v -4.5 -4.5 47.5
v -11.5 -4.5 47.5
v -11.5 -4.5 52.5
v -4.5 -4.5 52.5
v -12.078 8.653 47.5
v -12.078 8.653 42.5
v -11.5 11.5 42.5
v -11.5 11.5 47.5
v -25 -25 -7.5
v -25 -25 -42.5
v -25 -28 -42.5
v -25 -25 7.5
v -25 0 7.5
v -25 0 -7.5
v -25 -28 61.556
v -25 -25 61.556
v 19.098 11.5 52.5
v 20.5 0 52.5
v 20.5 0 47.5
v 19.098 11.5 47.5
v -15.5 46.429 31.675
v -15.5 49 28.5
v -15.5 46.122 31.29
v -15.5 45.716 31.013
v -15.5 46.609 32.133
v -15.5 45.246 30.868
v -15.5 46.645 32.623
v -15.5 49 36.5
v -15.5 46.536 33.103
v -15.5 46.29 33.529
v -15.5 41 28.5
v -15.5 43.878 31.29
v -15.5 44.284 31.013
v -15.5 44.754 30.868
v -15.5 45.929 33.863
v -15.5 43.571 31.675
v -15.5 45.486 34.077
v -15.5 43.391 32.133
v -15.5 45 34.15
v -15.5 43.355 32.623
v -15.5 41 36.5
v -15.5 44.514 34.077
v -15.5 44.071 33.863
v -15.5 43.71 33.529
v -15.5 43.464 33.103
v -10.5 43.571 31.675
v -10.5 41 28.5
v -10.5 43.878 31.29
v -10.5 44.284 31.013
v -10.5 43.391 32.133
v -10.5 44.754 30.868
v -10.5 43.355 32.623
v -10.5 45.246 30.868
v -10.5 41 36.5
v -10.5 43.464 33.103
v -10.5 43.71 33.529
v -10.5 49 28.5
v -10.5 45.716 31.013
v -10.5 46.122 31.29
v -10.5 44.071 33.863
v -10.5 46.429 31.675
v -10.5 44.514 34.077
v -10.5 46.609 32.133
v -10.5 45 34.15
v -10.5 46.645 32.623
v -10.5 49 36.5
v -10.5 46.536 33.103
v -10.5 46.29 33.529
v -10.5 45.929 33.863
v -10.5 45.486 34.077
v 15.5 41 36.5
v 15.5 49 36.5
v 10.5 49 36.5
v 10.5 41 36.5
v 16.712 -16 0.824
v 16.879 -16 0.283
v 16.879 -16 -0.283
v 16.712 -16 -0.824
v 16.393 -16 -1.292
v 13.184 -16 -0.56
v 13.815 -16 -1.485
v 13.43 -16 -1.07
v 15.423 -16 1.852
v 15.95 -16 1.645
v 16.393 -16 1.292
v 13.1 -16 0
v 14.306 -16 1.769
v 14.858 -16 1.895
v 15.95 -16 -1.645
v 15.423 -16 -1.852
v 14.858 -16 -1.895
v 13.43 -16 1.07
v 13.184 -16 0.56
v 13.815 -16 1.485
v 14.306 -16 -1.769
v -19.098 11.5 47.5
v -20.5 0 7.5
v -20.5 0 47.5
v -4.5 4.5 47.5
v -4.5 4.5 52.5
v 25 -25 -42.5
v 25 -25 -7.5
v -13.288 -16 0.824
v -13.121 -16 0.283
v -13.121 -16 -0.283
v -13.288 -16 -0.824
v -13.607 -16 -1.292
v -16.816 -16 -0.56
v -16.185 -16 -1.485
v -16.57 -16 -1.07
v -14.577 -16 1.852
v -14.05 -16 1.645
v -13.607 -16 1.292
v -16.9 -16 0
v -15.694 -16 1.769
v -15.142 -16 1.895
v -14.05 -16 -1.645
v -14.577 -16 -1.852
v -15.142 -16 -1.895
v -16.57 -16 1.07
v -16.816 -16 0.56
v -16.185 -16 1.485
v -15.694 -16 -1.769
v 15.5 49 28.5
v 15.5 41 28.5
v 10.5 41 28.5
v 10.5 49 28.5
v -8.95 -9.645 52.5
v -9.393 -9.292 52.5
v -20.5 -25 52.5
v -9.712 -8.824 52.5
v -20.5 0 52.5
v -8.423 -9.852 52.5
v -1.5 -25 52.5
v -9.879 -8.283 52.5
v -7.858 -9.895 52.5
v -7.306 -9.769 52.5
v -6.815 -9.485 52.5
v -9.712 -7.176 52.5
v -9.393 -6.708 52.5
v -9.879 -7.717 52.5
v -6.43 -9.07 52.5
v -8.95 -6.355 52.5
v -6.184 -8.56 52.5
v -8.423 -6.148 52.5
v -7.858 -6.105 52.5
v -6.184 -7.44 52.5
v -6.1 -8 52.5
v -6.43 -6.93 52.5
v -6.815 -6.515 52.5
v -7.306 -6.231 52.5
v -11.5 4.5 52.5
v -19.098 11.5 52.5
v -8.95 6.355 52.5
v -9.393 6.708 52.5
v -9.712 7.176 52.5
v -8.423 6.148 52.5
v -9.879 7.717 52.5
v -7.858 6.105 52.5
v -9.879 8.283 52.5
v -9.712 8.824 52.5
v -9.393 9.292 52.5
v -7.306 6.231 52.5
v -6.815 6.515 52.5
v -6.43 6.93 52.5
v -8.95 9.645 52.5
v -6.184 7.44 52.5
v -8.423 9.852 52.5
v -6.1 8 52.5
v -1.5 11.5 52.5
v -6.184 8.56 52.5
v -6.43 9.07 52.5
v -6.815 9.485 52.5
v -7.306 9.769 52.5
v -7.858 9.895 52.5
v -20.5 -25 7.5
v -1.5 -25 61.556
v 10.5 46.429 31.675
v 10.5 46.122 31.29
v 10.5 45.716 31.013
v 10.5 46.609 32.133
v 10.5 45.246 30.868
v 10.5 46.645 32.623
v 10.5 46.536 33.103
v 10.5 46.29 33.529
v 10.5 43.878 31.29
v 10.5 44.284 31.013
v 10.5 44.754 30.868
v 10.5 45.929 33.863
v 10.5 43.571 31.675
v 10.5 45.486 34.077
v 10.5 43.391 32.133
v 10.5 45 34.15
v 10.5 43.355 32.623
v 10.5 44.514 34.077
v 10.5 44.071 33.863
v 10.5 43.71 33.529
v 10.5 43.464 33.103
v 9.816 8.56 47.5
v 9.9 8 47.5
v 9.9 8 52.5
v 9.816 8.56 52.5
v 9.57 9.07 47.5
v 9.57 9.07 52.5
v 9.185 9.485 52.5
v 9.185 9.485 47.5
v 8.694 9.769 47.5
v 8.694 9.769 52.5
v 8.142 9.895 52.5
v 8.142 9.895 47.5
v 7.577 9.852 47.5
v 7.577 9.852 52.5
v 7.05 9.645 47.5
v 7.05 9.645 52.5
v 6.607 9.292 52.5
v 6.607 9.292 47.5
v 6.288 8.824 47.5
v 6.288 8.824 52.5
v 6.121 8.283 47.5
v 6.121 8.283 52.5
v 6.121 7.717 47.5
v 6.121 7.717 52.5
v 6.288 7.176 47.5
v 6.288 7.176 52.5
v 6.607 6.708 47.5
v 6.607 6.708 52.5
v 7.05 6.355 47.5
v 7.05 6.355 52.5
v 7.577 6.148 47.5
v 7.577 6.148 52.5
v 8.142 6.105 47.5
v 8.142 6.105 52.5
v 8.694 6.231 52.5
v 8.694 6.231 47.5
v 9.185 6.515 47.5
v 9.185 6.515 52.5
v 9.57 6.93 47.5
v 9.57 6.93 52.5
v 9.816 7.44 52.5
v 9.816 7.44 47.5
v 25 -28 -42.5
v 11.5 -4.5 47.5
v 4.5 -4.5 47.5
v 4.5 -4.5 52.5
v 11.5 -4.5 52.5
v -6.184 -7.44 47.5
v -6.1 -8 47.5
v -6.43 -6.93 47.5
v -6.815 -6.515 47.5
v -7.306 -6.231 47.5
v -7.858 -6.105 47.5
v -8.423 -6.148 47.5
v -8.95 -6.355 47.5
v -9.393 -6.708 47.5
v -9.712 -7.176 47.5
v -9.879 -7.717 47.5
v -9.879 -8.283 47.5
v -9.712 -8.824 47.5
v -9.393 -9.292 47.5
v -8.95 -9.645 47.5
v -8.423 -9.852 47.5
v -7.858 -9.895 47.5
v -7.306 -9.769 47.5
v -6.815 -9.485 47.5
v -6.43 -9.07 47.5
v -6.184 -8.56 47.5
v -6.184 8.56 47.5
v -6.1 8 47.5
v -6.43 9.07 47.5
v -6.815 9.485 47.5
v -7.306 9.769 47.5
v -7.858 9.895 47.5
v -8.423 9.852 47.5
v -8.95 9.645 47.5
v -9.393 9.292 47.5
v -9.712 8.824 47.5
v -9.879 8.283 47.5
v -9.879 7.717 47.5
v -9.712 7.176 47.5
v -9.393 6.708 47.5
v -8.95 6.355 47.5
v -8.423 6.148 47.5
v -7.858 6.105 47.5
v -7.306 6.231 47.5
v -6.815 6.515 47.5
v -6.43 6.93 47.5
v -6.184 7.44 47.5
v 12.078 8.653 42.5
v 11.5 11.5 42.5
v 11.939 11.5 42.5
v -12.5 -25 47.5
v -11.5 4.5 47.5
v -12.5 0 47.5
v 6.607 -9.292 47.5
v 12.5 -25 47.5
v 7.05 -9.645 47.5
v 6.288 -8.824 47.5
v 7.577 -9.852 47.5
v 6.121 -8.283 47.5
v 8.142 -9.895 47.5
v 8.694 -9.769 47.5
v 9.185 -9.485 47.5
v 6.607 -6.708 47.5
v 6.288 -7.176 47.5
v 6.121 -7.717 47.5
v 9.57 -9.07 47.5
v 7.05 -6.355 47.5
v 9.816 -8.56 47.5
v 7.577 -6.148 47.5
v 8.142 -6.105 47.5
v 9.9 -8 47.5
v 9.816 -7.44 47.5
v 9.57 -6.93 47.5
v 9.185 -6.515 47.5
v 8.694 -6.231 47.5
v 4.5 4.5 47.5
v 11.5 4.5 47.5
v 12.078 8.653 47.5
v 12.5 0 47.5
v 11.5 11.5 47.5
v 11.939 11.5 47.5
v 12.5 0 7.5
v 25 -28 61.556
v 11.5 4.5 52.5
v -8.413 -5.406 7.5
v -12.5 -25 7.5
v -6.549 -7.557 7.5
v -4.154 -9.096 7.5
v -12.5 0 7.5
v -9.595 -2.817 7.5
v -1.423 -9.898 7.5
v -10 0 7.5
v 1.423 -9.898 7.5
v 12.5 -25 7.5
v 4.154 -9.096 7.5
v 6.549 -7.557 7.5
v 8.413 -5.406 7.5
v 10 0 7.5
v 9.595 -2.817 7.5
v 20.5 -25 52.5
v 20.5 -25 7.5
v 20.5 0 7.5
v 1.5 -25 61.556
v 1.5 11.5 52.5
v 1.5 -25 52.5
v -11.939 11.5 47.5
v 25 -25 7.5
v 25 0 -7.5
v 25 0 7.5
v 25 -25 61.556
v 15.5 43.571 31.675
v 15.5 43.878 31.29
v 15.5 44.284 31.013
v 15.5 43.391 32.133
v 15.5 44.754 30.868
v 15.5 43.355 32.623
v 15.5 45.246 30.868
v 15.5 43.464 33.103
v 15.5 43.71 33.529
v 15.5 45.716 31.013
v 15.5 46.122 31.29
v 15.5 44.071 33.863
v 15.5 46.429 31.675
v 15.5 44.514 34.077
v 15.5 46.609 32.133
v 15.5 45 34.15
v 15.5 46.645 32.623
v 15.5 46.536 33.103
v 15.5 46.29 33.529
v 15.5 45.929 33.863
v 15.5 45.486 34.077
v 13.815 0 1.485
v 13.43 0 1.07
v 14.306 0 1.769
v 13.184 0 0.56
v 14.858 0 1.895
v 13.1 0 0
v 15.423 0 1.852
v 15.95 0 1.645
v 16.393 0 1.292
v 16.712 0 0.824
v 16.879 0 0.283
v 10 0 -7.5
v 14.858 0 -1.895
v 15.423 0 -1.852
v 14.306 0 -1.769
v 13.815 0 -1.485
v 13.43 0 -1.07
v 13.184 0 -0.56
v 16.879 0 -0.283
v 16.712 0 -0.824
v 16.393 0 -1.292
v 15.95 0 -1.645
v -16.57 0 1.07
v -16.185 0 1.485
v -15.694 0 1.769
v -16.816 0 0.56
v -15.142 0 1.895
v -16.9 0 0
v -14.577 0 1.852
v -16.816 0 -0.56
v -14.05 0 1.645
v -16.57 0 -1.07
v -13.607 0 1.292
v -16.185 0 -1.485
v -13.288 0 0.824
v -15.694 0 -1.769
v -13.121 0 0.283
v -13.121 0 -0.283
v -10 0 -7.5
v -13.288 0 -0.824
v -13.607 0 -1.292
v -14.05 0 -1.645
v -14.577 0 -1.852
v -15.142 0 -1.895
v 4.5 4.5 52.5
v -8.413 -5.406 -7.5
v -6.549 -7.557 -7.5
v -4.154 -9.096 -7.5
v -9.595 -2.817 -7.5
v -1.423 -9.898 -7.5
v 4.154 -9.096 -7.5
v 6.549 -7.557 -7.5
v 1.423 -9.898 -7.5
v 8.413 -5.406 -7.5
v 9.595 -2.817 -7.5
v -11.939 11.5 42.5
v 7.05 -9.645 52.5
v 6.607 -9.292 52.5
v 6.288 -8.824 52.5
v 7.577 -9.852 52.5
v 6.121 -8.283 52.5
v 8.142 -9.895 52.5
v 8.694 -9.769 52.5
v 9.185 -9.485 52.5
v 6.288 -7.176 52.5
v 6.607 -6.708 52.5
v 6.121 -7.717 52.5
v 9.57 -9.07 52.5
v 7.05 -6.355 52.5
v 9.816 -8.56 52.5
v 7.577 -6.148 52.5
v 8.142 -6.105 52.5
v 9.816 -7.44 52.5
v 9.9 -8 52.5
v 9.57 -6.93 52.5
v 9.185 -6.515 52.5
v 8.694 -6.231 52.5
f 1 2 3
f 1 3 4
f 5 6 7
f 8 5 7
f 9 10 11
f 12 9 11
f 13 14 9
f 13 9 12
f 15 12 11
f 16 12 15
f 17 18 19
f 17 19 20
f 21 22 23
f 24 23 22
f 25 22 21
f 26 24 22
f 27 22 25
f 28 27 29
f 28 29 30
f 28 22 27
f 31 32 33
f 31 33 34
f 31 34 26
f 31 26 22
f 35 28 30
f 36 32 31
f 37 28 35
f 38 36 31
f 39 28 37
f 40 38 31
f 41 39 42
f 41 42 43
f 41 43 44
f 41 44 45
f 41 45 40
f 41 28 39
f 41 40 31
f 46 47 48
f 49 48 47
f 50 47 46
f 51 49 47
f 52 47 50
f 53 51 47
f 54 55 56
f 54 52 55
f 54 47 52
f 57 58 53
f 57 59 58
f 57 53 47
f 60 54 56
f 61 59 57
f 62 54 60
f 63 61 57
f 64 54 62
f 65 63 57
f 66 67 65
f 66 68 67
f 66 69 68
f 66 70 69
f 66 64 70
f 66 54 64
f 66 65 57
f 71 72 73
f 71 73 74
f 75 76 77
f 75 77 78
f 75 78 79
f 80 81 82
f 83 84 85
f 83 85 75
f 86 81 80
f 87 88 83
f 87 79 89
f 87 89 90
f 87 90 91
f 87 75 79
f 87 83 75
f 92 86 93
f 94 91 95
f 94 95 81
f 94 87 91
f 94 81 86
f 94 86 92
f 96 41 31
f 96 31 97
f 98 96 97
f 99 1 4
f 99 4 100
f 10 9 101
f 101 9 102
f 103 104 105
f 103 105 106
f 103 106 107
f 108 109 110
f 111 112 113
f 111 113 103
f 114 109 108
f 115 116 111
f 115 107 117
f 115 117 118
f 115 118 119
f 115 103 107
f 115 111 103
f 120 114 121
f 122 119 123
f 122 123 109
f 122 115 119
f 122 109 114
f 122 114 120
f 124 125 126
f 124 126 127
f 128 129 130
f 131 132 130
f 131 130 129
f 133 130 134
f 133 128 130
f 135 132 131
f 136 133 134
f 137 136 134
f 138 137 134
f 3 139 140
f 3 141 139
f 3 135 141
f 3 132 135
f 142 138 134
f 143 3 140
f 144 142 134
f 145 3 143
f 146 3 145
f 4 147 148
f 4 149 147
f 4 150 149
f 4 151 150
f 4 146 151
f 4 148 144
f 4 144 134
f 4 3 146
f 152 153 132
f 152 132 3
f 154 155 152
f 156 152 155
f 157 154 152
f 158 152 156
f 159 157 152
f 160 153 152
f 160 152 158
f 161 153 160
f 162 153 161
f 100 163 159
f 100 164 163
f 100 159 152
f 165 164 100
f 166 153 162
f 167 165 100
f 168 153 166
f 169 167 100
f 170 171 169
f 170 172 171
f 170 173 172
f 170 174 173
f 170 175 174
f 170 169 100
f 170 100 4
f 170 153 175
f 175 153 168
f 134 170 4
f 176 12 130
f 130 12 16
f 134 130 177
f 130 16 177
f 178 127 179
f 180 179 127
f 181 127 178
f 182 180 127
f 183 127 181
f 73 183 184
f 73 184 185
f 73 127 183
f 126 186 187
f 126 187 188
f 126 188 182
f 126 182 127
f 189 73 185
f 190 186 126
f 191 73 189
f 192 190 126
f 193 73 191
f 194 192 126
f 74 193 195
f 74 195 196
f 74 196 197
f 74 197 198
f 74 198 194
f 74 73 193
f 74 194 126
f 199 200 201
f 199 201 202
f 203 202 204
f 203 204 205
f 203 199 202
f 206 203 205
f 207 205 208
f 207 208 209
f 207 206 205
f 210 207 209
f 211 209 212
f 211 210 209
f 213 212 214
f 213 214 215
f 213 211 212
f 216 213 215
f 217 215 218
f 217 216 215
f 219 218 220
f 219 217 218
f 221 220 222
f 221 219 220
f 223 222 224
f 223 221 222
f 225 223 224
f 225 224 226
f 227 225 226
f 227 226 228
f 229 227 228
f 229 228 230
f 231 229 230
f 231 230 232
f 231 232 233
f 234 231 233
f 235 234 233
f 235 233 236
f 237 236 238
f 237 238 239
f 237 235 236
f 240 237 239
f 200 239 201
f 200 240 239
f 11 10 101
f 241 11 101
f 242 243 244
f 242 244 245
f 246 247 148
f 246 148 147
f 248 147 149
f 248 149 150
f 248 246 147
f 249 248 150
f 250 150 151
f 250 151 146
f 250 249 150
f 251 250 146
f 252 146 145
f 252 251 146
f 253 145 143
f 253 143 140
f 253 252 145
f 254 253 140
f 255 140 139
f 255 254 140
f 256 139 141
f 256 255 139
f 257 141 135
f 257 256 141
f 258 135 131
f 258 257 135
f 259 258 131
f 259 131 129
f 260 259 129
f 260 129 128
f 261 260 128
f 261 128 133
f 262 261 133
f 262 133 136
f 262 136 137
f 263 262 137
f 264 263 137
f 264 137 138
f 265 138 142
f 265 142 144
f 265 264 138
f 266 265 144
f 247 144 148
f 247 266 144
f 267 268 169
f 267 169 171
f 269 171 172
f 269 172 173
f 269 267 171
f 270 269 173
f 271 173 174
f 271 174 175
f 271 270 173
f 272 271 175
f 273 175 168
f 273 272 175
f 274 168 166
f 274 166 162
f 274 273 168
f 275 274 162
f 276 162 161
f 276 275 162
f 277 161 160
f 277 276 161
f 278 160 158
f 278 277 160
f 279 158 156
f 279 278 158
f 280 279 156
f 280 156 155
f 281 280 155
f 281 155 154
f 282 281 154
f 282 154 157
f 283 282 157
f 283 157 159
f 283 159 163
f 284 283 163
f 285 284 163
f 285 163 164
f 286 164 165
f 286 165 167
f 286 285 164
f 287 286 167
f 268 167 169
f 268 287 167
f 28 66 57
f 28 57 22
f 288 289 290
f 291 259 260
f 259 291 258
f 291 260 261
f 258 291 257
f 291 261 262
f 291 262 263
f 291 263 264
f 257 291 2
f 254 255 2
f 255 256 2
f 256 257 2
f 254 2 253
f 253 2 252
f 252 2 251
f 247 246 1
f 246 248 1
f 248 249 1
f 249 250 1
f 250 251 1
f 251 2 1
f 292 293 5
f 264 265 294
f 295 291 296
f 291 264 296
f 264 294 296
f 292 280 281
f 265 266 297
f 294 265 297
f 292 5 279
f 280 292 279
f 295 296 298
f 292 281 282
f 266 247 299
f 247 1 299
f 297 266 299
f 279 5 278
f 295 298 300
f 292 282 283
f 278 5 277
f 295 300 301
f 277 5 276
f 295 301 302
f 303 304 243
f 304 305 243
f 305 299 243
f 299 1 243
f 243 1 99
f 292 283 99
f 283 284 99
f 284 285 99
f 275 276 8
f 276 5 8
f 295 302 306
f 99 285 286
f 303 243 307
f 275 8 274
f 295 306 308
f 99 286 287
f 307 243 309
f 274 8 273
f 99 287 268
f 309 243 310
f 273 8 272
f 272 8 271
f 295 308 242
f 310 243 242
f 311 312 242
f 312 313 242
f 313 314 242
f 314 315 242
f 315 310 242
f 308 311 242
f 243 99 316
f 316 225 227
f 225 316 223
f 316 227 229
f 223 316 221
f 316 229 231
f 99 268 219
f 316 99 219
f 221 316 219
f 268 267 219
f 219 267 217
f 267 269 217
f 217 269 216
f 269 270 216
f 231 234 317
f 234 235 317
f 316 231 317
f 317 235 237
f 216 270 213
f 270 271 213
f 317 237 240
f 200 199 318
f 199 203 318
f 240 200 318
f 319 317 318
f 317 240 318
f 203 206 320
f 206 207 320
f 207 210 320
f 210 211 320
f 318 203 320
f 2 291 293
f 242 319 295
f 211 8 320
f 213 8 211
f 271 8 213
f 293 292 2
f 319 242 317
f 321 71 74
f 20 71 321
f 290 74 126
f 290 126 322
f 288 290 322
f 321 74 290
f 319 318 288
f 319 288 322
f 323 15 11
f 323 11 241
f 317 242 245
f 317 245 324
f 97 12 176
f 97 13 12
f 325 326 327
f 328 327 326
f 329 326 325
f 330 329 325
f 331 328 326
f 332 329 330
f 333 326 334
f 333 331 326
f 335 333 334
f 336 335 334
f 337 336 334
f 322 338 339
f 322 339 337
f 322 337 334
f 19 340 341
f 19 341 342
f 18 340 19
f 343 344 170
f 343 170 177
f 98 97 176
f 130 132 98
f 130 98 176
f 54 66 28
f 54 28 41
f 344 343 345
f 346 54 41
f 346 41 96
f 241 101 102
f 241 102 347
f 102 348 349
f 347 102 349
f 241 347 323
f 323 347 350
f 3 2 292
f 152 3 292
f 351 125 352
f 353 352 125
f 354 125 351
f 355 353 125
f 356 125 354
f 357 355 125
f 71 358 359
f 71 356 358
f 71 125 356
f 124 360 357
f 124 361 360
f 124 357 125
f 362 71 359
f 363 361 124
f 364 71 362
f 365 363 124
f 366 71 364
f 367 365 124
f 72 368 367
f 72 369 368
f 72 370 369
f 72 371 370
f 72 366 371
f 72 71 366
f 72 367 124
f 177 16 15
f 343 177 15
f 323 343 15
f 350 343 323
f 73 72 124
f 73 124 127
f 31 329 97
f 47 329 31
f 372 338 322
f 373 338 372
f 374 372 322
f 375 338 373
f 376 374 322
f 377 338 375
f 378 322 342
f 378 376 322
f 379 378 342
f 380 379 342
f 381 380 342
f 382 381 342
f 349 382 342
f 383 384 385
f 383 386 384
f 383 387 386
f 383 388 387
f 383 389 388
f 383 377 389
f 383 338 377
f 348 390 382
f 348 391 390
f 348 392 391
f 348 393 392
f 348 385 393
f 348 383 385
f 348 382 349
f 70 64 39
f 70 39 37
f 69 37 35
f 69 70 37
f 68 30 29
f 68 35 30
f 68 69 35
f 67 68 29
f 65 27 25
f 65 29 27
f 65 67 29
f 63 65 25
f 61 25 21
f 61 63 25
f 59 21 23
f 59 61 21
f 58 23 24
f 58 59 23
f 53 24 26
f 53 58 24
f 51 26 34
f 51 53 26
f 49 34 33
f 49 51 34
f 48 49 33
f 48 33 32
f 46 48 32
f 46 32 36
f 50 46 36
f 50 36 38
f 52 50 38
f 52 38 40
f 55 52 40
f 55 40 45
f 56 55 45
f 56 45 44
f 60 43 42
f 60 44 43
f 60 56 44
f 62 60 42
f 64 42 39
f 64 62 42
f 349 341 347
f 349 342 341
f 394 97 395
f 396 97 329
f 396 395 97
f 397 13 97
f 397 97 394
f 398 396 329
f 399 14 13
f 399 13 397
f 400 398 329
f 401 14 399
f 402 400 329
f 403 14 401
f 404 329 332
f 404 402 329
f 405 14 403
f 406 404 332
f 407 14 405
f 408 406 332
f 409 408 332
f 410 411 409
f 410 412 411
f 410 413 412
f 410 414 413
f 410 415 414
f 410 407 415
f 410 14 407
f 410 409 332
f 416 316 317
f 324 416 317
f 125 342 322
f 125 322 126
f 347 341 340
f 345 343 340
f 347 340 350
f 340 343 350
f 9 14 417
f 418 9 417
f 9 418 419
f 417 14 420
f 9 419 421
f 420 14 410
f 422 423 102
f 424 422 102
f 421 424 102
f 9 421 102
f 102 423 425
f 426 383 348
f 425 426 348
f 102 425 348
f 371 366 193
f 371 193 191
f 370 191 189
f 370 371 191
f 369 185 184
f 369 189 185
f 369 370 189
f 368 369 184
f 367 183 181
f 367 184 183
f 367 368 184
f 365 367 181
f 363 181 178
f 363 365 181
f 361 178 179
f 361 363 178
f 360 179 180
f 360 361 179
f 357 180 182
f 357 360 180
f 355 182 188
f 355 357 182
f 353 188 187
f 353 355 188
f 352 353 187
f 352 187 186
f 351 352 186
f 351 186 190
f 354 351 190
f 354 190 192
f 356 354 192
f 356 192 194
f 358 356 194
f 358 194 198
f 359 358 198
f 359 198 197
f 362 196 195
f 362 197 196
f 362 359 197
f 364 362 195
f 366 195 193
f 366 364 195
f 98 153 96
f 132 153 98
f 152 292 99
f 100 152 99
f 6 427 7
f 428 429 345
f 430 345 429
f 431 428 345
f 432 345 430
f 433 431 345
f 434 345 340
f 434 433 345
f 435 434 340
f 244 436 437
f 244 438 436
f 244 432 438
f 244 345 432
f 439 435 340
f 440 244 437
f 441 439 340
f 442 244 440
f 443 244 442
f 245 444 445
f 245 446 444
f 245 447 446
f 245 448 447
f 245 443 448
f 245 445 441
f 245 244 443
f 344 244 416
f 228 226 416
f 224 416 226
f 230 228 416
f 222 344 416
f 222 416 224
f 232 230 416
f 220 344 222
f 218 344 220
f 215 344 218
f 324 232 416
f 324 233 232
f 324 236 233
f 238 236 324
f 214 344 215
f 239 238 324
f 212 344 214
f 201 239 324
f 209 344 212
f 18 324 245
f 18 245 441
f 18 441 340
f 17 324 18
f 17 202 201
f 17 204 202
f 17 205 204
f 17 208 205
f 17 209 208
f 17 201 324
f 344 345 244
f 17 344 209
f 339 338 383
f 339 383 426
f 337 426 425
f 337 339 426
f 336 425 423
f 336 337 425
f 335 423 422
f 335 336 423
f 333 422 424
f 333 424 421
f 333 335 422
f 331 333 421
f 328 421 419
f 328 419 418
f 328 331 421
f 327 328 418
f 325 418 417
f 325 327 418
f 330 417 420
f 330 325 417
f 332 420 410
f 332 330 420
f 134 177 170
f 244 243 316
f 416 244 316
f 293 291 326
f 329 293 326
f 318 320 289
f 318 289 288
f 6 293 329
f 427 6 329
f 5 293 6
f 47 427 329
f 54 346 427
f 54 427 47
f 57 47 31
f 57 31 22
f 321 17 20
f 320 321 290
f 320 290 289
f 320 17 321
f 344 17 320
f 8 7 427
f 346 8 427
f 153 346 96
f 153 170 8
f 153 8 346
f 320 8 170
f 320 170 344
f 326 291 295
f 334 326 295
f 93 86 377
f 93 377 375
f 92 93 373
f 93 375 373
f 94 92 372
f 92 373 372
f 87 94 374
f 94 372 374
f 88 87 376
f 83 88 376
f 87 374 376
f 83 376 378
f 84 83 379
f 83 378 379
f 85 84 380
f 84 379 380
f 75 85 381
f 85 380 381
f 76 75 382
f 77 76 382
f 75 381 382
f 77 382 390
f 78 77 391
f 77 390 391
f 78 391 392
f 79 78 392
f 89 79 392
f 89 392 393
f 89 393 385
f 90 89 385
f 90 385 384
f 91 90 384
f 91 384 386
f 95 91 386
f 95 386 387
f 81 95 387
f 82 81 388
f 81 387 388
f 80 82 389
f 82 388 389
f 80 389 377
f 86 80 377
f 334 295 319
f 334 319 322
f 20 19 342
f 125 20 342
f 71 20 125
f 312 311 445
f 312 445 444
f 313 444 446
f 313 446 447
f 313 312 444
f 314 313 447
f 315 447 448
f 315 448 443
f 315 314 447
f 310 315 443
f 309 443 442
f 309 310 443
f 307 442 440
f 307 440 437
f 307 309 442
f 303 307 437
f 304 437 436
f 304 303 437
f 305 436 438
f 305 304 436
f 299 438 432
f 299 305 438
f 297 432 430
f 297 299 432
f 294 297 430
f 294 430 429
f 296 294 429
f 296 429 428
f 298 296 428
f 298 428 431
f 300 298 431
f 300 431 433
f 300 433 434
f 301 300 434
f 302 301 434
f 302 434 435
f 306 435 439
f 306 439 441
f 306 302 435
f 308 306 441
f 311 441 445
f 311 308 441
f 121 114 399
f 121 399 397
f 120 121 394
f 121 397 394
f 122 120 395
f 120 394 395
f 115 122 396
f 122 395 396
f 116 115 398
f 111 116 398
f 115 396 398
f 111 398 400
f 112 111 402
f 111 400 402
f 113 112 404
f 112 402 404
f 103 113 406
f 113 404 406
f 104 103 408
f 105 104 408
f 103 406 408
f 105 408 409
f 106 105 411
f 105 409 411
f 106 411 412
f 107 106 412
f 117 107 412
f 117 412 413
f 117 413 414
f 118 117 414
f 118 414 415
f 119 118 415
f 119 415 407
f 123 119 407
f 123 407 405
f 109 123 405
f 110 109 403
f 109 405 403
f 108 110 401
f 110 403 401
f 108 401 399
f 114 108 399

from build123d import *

# Parameters (mm, degrees)
MOTOR_MOUNT_SOLID_DEPTH              = 7.5
ENCODER_DISTANCE_SKETCH_W            = 50
ENCODER_DISTANCE_SKETCH_H            = 55
ENCODER_DISTANCE_SOLID_DEPTH         = 5
ENCODER_MOUNT_SKETCH_R               = 1.9
ENCODER_MOUNT_SKETCH_W               = 7
ENCODER_MOUNT_SKETCH_H               = 9
ENCODER_MOUNT_SOLID_DEPTH            = 5
MOTOR_CLAMP_MOUNTING_HOLES_SKETCH_R  = 1.9
MOTOR_CLAMP_MOUNTING_HOLES_CUT_DEPTH = 16
GUSSET_PLATE_SKETCH_W                = 50
GUSSET_PLATE_SKETCH_H                = 5
GUSSET_PLATE_SOLID_DEPTH             = 16.5
GUSSET_SOLID_DEPTH                   = 1.5
MOUNTING_PLATE_SKETCH_W              = 50
MOUNTING_PLATE_SKETCH_H              = 92
MOUNTING_PLATE_SKETCH_R              = 2.65
MOUNTING_PLATE_SOLID_DEPTH           = 5
MOUNTING_HOLES_CUT_DEPTH             = 100.036609393
MOUNTING_HOLES_CUT_DEPTH_BACK        = 100.036609393
MOUNTING_HOLE_SKETCH_R               = 2.65
MOUNTING_PLATE_TRIM_SKETCH_W         = 50
MOUNTING_PLATE_TRIM_SKETCH_H         = 15.5
MOUNTING_PLATE_TRIM_SKETCH_H_2       = 40
MOUNTING_PLATE_TRIM_SKETCH_W_2       = 23.5
MOUNTING_PLATE_TRIM_SKETCH_H_3       = 16.5
MOUNTING_PLATE_TRIM_CUT_DEPTH        = 2
CUT_EXTRUDE1_DEPTH                   = 105.216121594
CUT_EXTRUDE1_DEPTH_BACK              = 105.216121594
SKETCH1_W                            = 92
SKETCH1_H                            = 35
SKETCH2_W                            = 50
SKETCH2_H                            = 104.056390977
BOSS_EXTRUDE1_DEPTH                  = 3
SKETCH3_W                            = 8
SKETCH3_H                            = 40
BOSS_EXTRUDE2_DEPTH                  = 25
BOSS_EXTRUDE3_DEPTH                  = 40
CUT_EXTRUDE2_DEPTH                   = 89.489769297
CUT_EXTRUDE2_DEPTH_BACK              = 89.489769297
SKETCH5_R                            = 1.65
CUT_EXTRUDE3_DEPTH                   = 89.489769297
CUT_EXTRUDE3_DEPTH_BACK              = 89.489769297
BOSS_EXTRUDE4_DEPTH                  = 10


with BuildPart() as part:
    # Mouting Mount Sketch → Motor Mount Solid (new, symmetric)
    with BuildSketch(Plane.XY):
        with BuildLine():
            Line((-25, -55), (25, -55))
            Line((25, -55), (25, 0))
            Line((25, 0), (10, 0))
            ThreePointArc((10, 0), (0, -10), (-10, 0))
            Line((-10, 0), (-25, 0))
            Line((-25, 0), (-25, -55))
        make_face()
    extrude(amount=MOTOR_MOUNT_SOLID_DEPTH, both=True)

    # Encoder Distance Sketch → Encoder Distance Solid (add)
    with BuildSketch(Plane.XZ.offset(55)):
        with Locations((0, 20)):
            Rectangle(ENCODER_DISTANCE_SKETCH_W, ENCODER_DISTANCE_SKETCH_H)
    extrude(amount=ENCODER_DISTANCE_SOLID_DEPTH)

    # Encoder Mount Sketch → Encoder Mount Solid (add)
    with BuildSketch(Plane.XY.offset(47.5)):
        Polygon((-25, -60), (-25, -55), (-11.5, 11.5), (11.5, 11.5), (25, -55), (25, -60), align=None)
        with Locations((-8, 8)):
            Circle(ENCODER_MOUNT_SKETCH_R, mode=Mode.SUBTRACT)
        with Locations((8, 8)):
            Circle(ENCODER_MOUNT_SKETCH_R, mode=Mode.SUBTRACT)
        with Locations((-8, -8)):
            Circle(ENCODER_MOUNT_SKETCH_R, mode=Mode.SUBTRACT)
        with Locations((8, -8)):
            Circle(ENCODER_MOUNT_SKETCH_R, mode=Mode.SUBTRACT)
        with Locations((-8, 0)):
            Rectangle(ENCODER_MOUNT_SKETCH_W, ENCODER_MOUNT_SKETCH_H, mode=Mode.SUBTRACT)
        with Locations((8, 0)):
            Rectangle(ENCODER_MOUNT_SKETCH_W, ENCODER_MOUNT_SKETCH_H, mode=Mode.SUBTRACT)
    extrude(amount=ENCODER_MOUNT_SOLID_DEPTH)

    # Motor Clamp Mounting Holes Sketch → Motor Clamp Mounting Holes Cut (cut)
    with BuildSketch(Plane(origin=(0, 0, 0), x_dir=(1, 0, 0), z_dir=(0, 1, 0))):
        with Locations(Location((-15, 0, 0), (0, 0, 180))):
            Circle(MOTOR_CLAMP_MOUNTING_HOLES_SKETCH_R)
        with Locations(Location((15, 0, 0), (0, 0, 180))):
            Circle(MOTOR_CLAMP_MOUNTING_HOLES_SKETCH_R)
    extrude(amount=-MOTOR_CLAMP_MOUNTING_HOLES_CUT_DEPTH, mode=Mode.SUBTRACT)

    # Gusset Plate Sketch → Gusset Plate Solid (add)
    with BuildSketch(Plane.XY.offset(52.5)):
        with Locations((0, -57.5)):
            Rectangle(GUSSET_PLATE_SKETCH_W, GUSSET_PLATE_SKETCH_H)
    extrude(amount=GUSSET_PLATE_SOLID_DEPTH)

    # Gusset Sketch → Gusset Solid (add, symmetric)
    with BuildSketch(Plane(origin=(0, 0, 0), x_dir=(0, 0, -1), z_dir=(1, 0, 0))):
        Polygon((-52.5, 11.5), (-69, -55), (-52.5, -55), align=None)
    extrude(amount=GUSSET_SOLID_DEPTH, both=True)

    # Mounting Plate Sketch → Mounting Plate Solid (add)
    with BuildSketch(Plane(origin=(0, -55, 0), x_dir=(1, 0, 0), z_dir=(0, 1, 0))):
        with Locations((0, -23)):
            Rectangle(MOUNTING_PLATE_SKETCH_W, MOUNTING_PLATE_SKETCH_H)
        with Locations((-19, -63)):
            Circle(MOUNTING_PLATE_SKETCH_R, mode=Mode.SUBTRACT)
        with Locations((19, -63)):
            Circle(MOUNTING_PLATE_SKETCH_R, mode=Mode.SUBTRACT)
        with Locations(Location((-19, 17, 0), (0, 0, 270))):
            Circle(MOUNTING_PLATE_SKETCH_R, mode=Mode.SUBTRACT)
        with Locations(Location((19, 17, 0), (0, 0, 270))):
            Circle(MOUNTING_PLATE_SKETCH_R, mode=Mode.SUBTRACT)
    extrude(amount=-MOUNTING_PLATE_SOLID_DEPTH)

    # Mounting Hole Sketch → Mounting Holes Cut (cut, two sides: drawn at the far end of the back side and taken through both)
    with BuildSketch(Plane(origin=(0, -55, 0), x_dir=(1, 0, 0), z_dir=(0, 1, 0)).offset(-MOUNTING_HOLES_CUT_DEPTH_BACK)):
        with Locations(Location((-19, 17, 0), (0, 0, 270))):
            Circle(MOUNTING_HOLE_SKETCH_R)
        with Locations(Location((19, 17, 0), (0, 0, 270))):
            Circle(MOUNTING_HOLE_SKETCH_R)
        with Locations(Location((19, -63, 0), (0, 0, 90))):
            Circle(MOUNTING_HOLE_SKETCH_R)
        with Locations(Location((-19, -63, 0), (0, 0, 90))):
            Circle(MOUNTING_HOLE_SKETCH_R)
    extrude(amount=MOUNTING_HOLES_CUT_DEPTH + MOUNTING_HOLES_CUT_DEPTH_BACK, mode=Mode.SUBTRACT)

    # Mounting Plate Trim Sketch → Mounting Plate Trim Cut (cut)
    with BuildSketch(Plane(origin=(0, -55, 0), x_dir=(1, 0, 0), z_dir=(0, 1, 0))):
        with Locations((0, 15.25)):
            Rectangle(MOUNTING_PLATE_TRIM_SKETCH_W, MOUNTING_PLATE_TRIM_SKETCH_H)
        with Locations((0, -27.5)):
            Rectangle(MOUNTING_PLATE_TRIM_SKETCH_W, MOUNTING_PLATE_TRIM_SKETCH_H_2)
        with Locations((13.25, -60.75)):
            Rectangle(MOUNTING_PLATE_TRIM_SKETCH_W_2, MOUNTING_PLATE_TRIM_SKETCH_H_3)
        with Locations((-13.25, -60.75)):
            Rectangle(MOUNTING_PLATE_TRIM_SKETCH_W_2, MOUNTING_PLATE_TRIM_SKETCH_H_3)
    extrude(amount=-MOUNTING_PLATE_TRIM_CUT_DEPTH, mode=Mode.SUBTRACT)

    # Sketch1 → Cut-Extrude1 (cut, two sides: drawn at the far end of the back side and taken through both)
    with BuildSketch(Plane.ZY.offset(25).offset(-CUT_EXTRUDE1_DEPTH_BACK)):
        with Locations((23, -42.5)):
            Rectangle(SKETCH1_W, SKETCH1_H)
    extrude(amount=CUT_EXTRUDE1_DEPTH + CUT_EXTRUDE1_DEPTH_BACK, mode=Mode.SUBTRACT)


with BuildPart() as cut_extrude1_piece_1:
    # of the separate pieces the step leaves, piece 1, a body of its own (cut_extrude1_pieces)
    add(part.part.solids().sort_by_distance((-25, -25, -7.5))[0])



with BuildPart() as cut_extrude1_piece_2:
    # of the separate pieces the step leaves, piece 2, a body of its own (cut_extrude1_pieces)
    add(part.part.solids().sort_by_distance((11.5, 11.5, 47.5))[0])


with BuildPart() as cut_extrude1_piece_1_1:
    add(cut_extrude1_piece_1.part)

    add(cut_extrude1_piece_2.part)  # Boss-Extrude1 merges Cut-Extrude1 piece 2
    # Sketch2 → Boss-Extrude1 (add)
    with BuildSketch(Plane.XZ.offset(25)):
        with Locations((0, 9.528195489)):
            Rectangle(SKETCH2_W, SKETCH2_H)
    extrude(amount=BOSS_EXTRUDE1_DEPTH)

    # Sketch3 → Boss-Extrude2 (add)
    with BuildSketch(Plane(origin=(0, -25, 0), x_dir=(1, 0, 0), z_dir=(0, 1, 0))):
        with Locations((16.5, -27.5)):
            Rectangle(SKETCH3_W, SKETCH3_H)
        with Locations((-16.5, -27.5)):
            Rectangle(SKETCH3_W, SKETCH3_H)
    extrude(amount=BOSS_EXTRUDE2_DEPTH)

    # Sketch4 → Boss-Extrude3 (add)
    with BuildSketch(Plane.XY.offset(47.5)):
        Polygon((-15.5, 41), (-20.5, 0), (-12.5, 0), (-10.5, 41), (-10.5, 49), (-15.5, 49), align=None)
        Polygon((10.5, 49), (10.5, 41), (12.5, 0), (20.5, 0), (15.5, 41), (15.5, 49), align=None)
    extrude(amount=-BOSS_EXTRUDE3_DEPTH)

    # Sketch5 → Cut-Extrude2 (cut, two sides: drawn at the far end of the back side and taken through both)
    with BuildSketch(Plane.ZY.offset(15.5).offset(-CUT_EXTRUDE2_DEPTH_BACK)):
        with Locations((32.5, 45)):
            Circle(SKETCH5_R)
    extrude(amount=CUT_EXTRUDE2_DEPTH + CUT_EXTRUDE2_DEPTH_BACK, mode=Mode.SUBTRACT)

    # Sketch6 → Cut-Extrude3 (cut, two sides: drawn at the far end of the back side and taken through both)
    with BuildSketch(Plane.ZY.offset(15.5).offset(-CUT_EXTRUDE3_DEPTH_BACK)):
        Polygon((36.5, 41), (47.5, 11.5), (52.5, 11.5), (52.5, 49), (36.5, 49), align=None)
        Polygon((7.5, 0), (28.5, 41), (28.5, 49), (7.5, 49), align=None)
    extrude(amount=CUT_EXTRUDE3_DEPTH + CUT_EXTRUDE3_DEPTH_BACK, mode=Mode.SUBTRACT)

    # Sketch7 → Boss-Extrude4 (add)
    with BuildSketch(Plane.XY.offset(52.5)):
        Polygon((-11.5, 11.5), (-19.097560976, 11.5), (-20.5, 0), (-20.5, -25), (-18.909774436, -25), align=None)
        Polygon((11.5, 11.5), (18.909774436, -25), (20.5, -25), (20.5, 0), (19.097560976, 11.5), align=None)
    extrude(amount=-BOSS_EXTRUDE4_DEPTH)


solid = cut_extrude1_piece_1_1.part
